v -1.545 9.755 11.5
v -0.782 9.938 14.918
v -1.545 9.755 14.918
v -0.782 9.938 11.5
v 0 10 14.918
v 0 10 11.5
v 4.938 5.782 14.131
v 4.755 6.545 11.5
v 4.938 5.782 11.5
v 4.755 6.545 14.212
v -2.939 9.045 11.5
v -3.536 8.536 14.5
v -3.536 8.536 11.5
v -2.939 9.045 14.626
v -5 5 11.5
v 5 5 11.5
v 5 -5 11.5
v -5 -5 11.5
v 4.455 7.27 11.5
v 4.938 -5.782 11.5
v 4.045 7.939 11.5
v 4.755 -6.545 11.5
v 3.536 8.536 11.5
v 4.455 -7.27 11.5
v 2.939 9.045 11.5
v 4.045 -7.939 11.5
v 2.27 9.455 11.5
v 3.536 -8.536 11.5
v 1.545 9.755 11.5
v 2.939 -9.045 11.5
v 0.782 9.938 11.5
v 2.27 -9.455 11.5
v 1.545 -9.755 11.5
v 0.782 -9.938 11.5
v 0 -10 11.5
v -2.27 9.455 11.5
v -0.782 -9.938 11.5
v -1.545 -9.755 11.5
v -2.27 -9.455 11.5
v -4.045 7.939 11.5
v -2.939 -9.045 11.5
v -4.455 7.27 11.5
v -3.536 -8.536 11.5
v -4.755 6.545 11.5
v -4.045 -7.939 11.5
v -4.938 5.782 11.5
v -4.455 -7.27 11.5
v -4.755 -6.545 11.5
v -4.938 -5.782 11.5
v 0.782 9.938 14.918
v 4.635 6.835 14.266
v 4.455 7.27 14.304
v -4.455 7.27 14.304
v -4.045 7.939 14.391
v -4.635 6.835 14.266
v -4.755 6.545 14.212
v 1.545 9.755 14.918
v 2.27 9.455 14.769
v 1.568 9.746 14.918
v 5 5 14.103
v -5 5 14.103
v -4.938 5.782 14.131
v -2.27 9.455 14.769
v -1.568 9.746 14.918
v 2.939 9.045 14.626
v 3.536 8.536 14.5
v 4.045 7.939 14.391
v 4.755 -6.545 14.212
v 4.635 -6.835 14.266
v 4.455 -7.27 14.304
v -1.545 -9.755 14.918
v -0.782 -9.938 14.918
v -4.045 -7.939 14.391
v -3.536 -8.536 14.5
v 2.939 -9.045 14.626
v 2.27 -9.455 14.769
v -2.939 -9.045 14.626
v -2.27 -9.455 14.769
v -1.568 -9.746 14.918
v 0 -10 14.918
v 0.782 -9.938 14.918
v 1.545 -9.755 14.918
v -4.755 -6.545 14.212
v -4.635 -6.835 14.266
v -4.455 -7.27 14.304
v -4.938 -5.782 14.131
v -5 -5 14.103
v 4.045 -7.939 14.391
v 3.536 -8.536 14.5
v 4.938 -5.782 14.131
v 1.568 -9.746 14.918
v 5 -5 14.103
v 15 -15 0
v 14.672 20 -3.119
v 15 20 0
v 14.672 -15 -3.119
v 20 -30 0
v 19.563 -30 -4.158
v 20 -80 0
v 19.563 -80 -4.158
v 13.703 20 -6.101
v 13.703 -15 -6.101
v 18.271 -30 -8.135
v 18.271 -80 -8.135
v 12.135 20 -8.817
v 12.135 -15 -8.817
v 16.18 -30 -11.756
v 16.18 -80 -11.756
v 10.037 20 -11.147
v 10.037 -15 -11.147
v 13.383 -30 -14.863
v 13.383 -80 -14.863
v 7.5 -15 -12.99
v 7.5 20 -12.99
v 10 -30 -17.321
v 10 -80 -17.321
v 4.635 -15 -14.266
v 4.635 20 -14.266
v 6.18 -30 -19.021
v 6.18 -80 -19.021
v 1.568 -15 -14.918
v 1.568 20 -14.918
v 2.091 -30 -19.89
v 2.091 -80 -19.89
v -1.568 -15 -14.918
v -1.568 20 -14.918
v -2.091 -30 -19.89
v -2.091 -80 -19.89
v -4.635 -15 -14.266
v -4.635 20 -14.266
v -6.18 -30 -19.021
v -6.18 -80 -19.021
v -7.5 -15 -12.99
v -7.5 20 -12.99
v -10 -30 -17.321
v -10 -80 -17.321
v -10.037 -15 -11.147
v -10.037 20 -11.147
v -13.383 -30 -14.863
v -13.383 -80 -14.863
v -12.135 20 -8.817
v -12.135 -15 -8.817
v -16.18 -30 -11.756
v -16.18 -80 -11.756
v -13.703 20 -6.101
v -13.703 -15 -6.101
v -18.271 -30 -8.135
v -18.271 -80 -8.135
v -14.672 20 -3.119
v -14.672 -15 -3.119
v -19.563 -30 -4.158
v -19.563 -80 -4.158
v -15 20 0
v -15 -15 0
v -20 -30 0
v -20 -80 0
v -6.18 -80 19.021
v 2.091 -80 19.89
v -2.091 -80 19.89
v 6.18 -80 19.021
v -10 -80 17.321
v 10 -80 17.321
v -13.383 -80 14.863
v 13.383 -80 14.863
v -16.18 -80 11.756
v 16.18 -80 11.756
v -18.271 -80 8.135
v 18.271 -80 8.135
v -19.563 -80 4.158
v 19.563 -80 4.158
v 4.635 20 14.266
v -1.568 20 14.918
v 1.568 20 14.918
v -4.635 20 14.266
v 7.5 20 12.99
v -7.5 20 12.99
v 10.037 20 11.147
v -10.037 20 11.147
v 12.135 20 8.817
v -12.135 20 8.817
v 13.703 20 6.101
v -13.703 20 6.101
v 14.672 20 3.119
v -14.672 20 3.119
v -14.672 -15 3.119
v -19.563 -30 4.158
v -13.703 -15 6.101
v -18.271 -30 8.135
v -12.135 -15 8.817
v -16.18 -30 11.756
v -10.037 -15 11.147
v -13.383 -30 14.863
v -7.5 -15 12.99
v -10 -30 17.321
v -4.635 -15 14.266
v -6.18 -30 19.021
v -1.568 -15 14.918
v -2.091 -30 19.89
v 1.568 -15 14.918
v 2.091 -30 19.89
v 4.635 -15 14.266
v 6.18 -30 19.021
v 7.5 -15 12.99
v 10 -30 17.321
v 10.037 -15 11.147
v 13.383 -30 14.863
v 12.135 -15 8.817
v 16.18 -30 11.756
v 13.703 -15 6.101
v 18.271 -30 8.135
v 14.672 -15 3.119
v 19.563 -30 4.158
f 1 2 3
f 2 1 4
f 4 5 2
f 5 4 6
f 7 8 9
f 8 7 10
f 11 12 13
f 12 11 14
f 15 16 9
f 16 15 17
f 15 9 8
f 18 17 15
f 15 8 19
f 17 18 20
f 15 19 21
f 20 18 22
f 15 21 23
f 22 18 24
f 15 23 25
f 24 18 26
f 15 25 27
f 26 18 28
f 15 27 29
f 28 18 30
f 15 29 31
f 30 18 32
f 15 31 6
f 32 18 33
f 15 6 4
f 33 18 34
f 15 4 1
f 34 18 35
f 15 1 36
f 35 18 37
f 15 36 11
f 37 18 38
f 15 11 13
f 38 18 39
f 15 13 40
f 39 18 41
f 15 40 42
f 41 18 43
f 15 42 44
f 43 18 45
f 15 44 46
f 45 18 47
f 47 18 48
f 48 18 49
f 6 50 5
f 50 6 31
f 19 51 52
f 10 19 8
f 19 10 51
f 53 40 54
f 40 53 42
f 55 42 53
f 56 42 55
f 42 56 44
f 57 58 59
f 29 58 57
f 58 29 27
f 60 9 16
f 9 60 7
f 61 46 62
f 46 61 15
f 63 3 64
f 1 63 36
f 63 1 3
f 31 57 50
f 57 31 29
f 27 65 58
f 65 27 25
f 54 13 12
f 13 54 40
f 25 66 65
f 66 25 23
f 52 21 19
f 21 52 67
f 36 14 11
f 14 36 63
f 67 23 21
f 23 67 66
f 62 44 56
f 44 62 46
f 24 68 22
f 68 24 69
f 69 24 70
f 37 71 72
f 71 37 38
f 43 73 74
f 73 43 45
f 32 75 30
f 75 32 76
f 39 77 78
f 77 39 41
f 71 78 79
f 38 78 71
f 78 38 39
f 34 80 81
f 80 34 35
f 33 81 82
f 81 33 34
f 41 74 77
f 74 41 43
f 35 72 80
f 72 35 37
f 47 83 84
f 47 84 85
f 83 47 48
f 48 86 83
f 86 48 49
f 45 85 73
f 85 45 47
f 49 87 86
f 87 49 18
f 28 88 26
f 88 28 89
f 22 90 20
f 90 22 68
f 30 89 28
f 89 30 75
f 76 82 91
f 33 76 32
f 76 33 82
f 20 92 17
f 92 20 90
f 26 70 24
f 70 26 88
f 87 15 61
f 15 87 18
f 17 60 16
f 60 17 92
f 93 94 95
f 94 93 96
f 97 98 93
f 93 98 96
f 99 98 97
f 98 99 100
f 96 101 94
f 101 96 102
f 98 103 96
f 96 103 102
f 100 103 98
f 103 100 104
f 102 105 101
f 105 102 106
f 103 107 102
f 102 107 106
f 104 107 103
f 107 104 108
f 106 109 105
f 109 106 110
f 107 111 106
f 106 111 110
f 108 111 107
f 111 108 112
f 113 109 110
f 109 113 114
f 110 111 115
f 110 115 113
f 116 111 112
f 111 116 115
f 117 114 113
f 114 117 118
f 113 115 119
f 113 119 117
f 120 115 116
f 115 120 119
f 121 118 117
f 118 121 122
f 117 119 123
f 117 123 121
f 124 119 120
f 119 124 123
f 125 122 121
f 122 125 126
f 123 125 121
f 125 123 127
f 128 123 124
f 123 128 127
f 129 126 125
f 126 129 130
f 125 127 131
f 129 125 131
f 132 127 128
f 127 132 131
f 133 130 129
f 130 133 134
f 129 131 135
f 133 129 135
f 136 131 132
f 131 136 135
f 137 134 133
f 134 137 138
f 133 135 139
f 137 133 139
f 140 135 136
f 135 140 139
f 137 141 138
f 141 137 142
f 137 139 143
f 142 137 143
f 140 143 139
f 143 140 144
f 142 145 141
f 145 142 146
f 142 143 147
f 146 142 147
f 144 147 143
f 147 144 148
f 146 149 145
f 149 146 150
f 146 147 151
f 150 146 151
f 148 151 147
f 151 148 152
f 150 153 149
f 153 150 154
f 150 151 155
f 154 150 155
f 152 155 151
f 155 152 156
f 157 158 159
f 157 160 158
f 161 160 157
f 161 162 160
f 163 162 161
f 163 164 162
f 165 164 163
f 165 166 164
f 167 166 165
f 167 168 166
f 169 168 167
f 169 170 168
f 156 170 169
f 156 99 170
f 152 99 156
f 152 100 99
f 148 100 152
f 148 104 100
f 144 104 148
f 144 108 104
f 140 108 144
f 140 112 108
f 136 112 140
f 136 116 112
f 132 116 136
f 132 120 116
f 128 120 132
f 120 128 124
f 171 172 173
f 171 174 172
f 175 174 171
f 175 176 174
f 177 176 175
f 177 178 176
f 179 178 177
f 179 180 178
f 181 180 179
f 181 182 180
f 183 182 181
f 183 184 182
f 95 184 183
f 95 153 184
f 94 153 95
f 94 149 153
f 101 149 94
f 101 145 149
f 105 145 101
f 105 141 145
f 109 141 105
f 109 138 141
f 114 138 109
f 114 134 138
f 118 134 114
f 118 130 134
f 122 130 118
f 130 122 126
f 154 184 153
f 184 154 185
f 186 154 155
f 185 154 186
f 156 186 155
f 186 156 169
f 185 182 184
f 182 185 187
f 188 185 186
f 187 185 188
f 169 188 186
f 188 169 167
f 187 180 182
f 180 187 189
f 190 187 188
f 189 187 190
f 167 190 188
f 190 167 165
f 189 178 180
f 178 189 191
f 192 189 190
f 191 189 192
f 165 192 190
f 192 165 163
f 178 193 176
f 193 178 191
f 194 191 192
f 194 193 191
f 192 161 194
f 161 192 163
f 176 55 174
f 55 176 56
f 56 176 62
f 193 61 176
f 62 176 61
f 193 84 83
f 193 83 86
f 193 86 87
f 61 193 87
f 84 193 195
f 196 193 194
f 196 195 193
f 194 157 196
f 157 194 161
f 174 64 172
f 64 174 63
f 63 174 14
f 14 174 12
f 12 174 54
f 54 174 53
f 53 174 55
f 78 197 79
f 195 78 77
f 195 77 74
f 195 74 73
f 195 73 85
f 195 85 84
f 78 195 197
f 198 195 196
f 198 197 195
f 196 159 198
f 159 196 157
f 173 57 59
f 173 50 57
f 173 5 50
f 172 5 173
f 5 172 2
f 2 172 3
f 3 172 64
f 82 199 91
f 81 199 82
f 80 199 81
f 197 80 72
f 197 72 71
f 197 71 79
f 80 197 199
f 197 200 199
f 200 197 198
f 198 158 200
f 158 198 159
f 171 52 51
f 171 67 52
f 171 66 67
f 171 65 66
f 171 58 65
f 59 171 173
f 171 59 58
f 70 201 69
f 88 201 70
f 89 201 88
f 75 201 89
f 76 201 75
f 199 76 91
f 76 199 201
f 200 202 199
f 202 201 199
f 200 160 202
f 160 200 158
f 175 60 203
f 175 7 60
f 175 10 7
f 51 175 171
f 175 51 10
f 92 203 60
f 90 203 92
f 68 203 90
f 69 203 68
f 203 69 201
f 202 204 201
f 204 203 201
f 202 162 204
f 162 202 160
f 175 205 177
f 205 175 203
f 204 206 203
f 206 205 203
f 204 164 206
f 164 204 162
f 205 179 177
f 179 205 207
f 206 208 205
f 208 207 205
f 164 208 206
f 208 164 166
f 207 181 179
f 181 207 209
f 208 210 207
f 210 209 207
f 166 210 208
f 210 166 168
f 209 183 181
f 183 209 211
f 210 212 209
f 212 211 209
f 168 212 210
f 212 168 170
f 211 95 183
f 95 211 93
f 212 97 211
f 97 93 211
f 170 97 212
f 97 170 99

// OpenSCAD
module Shaft_02(){

    color("gray")
    // translate([-1,0,-1])
    
    rotate([90,0,0])
    rotate_extrude(angle = 360)
    rotate([0,0,90])

    polygon(points=[[-20,0],[80,0],[80,20],[30,20],[15,15],[-20,15]]);

}
 

module Key(){

    Key_Lenght = 100;
    Key_Height = 100;
    Key_Width = 150;

    color("#a8b0b2")
    union(){
        translate([5,0,0])
        cylinder(5,5,5, $fn=40, center=true);

        translate([-5,0,0])
        cylinder(5,5,5, $fn=40, center=true);

        cube([10,10,5],center = true);
    }


}

difference(){
    Shaft_02();
        translate([0,0,14]){
            rotate([0,0,90]){
                Key();
            }
        }
}







// Written by Nicolì Angelo (Gengio) 2024: 
// MIT License

//Permission is hereby granted, free of charge, to any person obtaining a copy of this software and associated documentation files (the "Software"), to deal in the Software without restriction, including without limitation the rights to use, copy, modify, merge, publish, distribute, sublicense, and/or sell copies of the Software, and to permit persons to whom the Software is furnished to do so, subject to the following conditions:

//The above copyright notice and this permission notice shall be included in all copies or substantial portions of the Software.

//THE SOFTWARE IS PROVIDED "AS IS", WITHOUT WARRANTY OF ANY KIND, EXPRESS OR IMPLIED, INCLUDING BUT NOT LIMITED TO THE WARRANTIES OF MERCHANTABILITY, FITNESS FOR A PARTICULAR PURPOSE AND NONINFRINGEMENT. IN NO EVENT SHALL THE AUTHORS OR COPYRIGHT HOLDERS BE LIABLE FOR ANY CLAIM, DAMAGES OR OTHER LIABILITY, WHETHER IN AN ACTION OF CONTRACT, TORT OR OTHERWISE, ARISING FROM, OUT OF OR IN CONNECTION WITH THE SOFTWARE OR THE USE OR OTHER DEALINGS IN THE SOFTWARE.
